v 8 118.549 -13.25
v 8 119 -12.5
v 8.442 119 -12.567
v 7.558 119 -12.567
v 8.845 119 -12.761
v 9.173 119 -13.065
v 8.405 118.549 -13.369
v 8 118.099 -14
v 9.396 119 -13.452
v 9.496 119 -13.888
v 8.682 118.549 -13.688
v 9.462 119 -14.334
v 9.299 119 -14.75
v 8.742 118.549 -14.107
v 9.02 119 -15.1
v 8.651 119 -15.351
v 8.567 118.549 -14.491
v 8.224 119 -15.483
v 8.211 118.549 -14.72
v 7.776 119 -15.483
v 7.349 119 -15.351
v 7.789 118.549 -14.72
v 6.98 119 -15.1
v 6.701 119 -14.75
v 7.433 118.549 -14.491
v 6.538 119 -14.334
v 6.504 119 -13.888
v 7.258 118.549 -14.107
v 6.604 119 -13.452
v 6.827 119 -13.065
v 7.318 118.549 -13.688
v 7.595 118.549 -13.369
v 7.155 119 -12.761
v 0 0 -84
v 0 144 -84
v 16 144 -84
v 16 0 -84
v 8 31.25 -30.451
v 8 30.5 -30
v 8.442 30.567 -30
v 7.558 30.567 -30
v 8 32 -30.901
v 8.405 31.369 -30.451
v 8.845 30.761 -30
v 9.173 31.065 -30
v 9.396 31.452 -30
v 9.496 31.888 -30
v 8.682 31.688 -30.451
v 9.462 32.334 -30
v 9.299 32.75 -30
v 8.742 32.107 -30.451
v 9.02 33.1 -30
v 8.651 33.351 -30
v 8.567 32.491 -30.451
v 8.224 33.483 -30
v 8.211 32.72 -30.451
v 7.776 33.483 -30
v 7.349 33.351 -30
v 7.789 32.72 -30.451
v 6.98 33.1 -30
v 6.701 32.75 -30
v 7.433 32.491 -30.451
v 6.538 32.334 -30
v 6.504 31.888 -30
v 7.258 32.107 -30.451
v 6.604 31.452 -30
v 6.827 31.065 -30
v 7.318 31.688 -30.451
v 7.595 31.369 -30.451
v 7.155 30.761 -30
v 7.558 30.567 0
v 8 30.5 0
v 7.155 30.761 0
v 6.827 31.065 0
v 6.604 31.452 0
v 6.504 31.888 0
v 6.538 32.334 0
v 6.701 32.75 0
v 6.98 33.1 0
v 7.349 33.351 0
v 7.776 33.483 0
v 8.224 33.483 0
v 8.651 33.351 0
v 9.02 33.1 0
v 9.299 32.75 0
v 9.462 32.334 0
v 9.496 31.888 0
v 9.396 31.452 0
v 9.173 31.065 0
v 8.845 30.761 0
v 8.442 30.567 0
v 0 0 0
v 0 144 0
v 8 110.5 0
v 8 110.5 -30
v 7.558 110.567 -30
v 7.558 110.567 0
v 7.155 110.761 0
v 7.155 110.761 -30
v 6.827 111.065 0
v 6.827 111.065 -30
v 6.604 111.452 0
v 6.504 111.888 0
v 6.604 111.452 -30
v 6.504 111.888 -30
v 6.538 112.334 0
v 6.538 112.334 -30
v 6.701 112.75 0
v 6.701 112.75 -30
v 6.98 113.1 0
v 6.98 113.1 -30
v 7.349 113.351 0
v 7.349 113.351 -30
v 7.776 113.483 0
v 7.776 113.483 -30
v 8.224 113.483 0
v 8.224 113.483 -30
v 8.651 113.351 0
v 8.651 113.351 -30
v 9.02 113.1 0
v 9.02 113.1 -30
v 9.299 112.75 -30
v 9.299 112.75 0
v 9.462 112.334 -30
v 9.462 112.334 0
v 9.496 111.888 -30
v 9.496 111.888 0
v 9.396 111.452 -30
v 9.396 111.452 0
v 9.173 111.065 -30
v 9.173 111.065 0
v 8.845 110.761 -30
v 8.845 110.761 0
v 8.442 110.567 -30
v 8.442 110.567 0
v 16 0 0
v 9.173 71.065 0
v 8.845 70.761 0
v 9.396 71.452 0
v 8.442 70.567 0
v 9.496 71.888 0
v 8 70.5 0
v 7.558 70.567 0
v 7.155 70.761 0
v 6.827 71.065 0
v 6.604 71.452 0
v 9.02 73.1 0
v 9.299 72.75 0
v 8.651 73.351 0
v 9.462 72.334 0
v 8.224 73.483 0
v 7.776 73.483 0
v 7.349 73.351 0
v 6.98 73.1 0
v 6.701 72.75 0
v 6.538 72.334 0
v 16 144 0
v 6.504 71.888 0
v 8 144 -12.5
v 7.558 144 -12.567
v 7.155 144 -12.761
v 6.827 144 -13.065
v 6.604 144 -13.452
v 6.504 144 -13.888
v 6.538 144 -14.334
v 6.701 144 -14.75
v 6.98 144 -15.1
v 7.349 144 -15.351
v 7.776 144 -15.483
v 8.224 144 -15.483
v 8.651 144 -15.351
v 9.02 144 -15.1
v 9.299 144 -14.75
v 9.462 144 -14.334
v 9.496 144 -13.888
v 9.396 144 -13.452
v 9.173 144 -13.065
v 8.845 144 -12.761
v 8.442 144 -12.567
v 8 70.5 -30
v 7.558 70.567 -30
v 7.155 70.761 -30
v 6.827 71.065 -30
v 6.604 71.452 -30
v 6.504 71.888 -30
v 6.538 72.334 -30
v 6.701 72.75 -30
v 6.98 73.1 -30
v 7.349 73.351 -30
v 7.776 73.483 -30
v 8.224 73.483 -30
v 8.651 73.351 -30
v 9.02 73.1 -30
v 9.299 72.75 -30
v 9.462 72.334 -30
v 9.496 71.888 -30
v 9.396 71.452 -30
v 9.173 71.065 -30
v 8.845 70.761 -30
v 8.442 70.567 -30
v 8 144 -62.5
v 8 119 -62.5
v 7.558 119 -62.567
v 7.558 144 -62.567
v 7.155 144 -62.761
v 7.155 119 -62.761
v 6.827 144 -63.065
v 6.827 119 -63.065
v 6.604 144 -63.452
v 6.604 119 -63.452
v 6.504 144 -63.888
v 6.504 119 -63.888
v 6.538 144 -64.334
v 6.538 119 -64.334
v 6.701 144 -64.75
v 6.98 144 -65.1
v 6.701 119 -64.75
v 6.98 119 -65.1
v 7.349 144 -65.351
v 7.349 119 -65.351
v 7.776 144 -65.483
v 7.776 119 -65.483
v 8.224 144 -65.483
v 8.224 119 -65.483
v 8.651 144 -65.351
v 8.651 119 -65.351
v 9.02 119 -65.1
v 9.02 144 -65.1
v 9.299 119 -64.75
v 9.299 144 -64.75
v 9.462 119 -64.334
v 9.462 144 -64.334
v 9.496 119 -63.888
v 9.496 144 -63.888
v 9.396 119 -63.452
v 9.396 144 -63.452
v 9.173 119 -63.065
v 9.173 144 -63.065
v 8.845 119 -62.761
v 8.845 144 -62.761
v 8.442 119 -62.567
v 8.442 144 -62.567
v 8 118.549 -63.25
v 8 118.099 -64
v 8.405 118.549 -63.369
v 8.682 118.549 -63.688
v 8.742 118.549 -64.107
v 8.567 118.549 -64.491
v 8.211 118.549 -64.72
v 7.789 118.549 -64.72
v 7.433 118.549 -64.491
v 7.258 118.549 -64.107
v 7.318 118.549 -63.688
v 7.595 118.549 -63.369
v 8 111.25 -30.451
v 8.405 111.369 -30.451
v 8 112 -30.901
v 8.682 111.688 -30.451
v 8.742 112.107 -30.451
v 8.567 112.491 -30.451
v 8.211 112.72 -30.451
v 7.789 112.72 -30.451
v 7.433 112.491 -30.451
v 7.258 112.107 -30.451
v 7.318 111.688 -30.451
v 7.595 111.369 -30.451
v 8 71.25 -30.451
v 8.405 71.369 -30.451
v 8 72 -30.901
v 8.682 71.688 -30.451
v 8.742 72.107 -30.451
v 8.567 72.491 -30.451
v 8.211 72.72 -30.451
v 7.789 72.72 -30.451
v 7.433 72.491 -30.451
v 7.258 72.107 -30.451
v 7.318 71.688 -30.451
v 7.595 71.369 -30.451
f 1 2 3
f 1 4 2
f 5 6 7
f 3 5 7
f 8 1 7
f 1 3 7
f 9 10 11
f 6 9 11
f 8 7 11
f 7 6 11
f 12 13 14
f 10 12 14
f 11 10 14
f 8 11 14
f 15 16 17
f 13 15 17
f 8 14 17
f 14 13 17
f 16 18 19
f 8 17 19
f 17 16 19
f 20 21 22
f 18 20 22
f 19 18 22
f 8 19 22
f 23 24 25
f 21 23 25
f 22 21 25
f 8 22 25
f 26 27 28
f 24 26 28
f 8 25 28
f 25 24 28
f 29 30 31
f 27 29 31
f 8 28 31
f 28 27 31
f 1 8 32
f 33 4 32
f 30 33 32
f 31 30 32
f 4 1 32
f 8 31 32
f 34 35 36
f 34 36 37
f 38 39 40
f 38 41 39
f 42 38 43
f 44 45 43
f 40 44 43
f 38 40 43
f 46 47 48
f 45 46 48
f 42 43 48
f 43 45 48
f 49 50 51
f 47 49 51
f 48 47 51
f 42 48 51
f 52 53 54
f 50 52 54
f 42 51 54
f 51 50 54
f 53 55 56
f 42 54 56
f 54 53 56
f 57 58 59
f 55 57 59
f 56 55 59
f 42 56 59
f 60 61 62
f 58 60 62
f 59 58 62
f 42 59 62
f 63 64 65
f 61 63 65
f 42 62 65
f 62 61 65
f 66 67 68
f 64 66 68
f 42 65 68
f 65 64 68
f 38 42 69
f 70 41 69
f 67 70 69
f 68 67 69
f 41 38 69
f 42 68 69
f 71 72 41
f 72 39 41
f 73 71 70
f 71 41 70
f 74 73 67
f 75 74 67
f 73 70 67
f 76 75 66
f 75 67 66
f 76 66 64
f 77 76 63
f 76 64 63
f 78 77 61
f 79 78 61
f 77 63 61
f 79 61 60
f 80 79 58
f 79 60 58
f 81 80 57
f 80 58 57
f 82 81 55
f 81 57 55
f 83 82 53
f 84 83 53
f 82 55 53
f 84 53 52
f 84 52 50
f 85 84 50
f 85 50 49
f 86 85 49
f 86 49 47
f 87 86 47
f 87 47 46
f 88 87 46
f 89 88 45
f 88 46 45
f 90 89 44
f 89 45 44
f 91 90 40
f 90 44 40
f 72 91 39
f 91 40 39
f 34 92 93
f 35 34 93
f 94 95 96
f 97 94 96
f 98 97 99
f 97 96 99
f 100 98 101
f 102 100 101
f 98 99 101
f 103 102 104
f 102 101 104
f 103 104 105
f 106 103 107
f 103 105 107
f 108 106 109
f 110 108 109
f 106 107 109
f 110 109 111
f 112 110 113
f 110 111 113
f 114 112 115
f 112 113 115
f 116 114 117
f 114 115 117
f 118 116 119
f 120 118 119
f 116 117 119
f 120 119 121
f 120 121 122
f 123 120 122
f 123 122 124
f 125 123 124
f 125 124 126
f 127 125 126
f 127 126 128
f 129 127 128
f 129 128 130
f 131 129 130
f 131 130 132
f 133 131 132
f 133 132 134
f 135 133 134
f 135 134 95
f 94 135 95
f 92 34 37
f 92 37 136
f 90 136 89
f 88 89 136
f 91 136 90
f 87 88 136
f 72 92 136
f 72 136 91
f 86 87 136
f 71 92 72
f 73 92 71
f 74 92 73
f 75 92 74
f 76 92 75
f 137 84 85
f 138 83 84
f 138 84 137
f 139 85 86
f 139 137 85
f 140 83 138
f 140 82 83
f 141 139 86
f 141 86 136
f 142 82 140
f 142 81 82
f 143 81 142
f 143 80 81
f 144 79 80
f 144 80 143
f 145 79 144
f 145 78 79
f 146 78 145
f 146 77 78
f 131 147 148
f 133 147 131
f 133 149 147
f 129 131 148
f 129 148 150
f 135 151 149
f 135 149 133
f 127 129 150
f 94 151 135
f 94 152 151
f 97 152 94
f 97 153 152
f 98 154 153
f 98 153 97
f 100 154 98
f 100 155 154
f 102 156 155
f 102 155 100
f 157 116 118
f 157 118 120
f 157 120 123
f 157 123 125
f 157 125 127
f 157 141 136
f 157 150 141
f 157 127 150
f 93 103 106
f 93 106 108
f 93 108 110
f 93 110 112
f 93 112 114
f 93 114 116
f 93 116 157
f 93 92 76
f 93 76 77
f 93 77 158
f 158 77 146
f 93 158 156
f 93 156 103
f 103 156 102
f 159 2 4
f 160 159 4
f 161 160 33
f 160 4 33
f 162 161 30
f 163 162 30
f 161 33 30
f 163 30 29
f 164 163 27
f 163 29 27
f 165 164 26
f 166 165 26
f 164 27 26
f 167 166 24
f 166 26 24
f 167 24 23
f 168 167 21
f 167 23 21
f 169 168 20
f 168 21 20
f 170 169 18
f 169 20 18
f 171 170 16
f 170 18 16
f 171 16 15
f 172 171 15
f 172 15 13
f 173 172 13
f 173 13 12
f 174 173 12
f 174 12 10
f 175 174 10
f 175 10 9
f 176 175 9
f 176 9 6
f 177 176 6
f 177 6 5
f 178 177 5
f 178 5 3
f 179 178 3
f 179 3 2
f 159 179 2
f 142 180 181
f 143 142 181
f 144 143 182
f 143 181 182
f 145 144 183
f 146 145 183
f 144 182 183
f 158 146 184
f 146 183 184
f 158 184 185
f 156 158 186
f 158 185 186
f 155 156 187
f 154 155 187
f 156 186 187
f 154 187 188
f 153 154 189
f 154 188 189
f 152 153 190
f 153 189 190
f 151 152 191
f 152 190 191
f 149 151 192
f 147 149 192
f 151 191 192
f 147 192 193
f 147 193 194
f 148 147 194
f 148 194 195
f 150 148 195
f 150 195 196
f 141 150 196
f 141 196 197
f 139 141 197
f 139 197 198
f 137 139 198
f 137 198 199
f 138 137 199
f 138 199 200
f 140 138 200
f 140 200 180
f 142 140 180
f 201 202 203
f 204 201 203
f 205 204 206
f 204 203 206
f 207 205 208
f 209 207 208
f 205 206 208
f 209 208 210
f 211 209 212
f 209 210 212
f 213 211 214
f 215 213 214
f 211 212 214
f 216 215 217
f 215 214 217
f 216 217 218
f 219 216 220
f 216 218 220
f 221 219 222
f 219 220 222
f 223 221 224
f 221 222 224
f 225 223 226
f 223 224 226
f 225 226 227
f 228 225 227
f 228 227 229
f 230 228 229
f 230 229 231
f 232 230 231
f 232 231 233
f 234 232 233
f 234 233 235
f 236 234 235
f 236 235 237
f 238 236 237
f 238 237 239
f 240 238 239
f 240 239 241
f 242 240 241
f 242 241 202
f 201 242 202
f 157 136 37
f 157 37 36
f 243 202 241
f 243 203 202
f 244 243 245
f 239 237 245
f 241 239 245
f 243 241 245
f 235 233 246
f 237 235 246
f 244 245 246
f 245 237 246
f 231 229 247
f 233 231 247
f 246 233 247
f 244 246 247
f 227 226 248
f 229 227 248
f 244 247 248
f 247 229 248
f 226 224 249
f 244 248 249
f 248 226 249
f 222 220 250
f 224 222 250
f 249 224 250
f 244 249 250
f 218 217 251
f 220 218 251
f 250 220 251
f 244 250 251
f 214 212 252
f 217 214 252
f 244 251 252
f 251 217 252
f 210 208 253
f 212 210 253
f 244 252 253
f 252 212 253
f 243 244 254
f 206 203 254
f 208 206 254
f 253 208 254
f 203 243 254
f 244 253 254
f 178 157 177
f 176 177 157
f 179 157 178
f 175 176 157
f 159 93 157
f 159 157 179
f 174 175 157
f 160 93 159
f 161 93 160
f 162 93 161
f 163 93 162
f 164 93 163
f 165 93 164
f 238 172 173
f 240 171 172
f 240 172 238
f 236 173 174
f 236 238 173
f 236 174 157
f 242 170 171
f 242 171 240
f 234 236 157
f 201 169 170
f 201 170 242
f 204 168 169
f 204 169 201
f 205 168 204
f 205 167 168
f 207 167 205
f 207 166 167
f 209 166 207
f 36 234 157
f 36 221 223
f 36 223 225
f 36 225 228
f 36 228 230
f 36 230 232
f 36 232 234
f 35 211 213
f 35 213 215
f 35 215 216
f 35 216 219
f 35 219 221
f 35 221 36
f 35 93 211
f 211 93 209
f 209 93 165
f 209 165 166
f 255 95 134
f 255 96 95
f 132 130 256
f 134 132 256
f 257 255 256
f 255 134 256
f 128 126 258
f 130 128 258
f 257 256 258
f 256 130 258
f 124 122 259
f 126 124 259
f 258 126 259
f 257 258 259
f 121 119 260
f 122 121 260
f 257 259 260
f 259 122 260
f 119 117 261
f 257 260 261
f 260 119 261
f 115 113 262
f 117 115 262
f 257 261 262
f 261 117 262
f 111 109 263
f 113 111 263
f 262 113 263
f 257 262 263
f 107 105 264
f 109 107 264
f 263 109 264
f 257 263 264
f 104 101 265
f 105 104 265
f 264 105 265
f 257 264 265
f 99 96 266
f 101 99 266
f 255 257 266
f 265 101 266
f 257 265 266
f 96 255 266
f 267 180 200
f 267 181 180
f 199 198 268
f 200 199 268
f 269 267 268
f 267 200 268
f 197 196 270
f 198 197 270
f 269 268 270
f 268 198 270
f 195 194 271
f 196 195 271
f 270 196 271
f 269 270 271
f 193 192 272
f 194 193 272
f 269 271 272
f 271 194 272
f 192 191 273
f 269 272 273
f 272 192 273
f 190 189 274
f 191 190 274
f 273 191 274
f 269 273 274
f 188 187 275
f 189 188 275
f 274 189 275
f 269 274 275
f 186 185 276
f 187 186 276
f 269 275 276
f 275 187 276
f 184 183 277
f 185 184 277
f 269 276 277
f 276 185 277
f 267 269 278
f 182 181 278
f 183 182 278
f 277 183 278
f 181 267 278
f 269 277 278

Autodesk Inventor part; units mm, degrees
ref_plane "YZ Plane" through (0, 0, 0) normal (1, 0, 0) x (0, 1, 0)
ref_plane "XZ Plane" through (0, 0, 0) normal (0, 1, 0) x (-1, 0, 0)
ref_plane "XY Plane" through (0, 0, 0) normal (0, 0, 1) x (1, 0, 0)
sketch "Skizze1" plane through (0, 0, 0) normal (1, 0, 0) x (0, 1, 0)
  line L0 (0, 0) -> (144, 0)
  line L1 (144, 0) -> (144, -84)
  line L2 (144, -84) -> (0, -84)
  line L3 (0, -84) -> (0, 0)
  dimension "d0" = 144
  dimension "d1" = 84
extrude "Extrusion1" add sketch "Skizze1" along normal blind 16
sketch "Skizze2" plane through (0, 0, 0) normal (0, 0, 1) x (1, 0, 0)
  line L0 (0, 0) -> (0, 144) construction
  line L1 (0, 72) -> (16, 72) construction
  line L2 (16, 144) -> (16, 0) construction
  line L3 (0, 144) -> (16, 144) construction
  line L4 (8, 144) -> (8, 0) construction
  line L5 (0, 144) -> (16, 144) construction
  line L6 (0, 0) -> (16, 0) construction
  line L7 (0, 144) -> (16, 144) construction
  line L8 (16, 144) -> (16, 0) construction
  line L9 (16, 0) -> (0, 0) construction
  line L10 (0, 0) -> (0, 144) construction
  line L11 (0, 112) -> (16, 112) construction
  line L12 (0, 32) -> (16, 32) construction
  point P0 (8, 112)
  point P1 (8, 72)
  point P2 (8, 32)
  dimension "d4" = 40
  dimension "d5" = 40
hole "Bohrung1" at (8, 112, 0) at (8, 72, 0) at (8, 32, 0) direction (0, 0, -1) diameter 3 depth 30 tip angle 118
sketch "Skizze3" plane through (0, 144, 0) normal (0, 1, 0) x (1, 0, 0)
  line L0 (0, 0) -> (16, 0)
  line L1 (16, 0) -> (16, 84)
  line L2 (16, 84) -> (0, 84)
  line L3 (0, 84) -> (0, 0)
  line L4 (8, 0) -> (8, 84) construction
  line L5 (0, 84) -> (16, 84) construction
  line L6 (16, 0) -> (16, 84) construction
  line L7 (16, 42) -> (0, 42) construction
  line L8 (0, 84) -> (0, 0) construction
  line L9 (0, 14) -> (16, 14) construction
  line L10 (0, 64) -> (16, 64) construction
  point P0 (8, 14)
  point P1 (8, 64)
  dimension "d13" = 20
  dimension "d14" = 50
hole "Bohrung2" at (8, 144, -14) at (8, 144, -64) direction (0, -1, 0) diameter 3 depth 25 tip angle 118
equation "\"Biegeradius\" = Stärke"
equation "\"BreiteBiegungsfreistellung\" = Stärke"
equation "\"TiefeBiegungsfreistellung\" = 0.5 * Stärke"
equation "\"GrößeEckenfreistellung\" = 4 * Stärke"
equation "\"MinimalRest\" = 2 * Stärke"
equation "\"Übergangsradius\" = Biegeradius"
equation "\"JacobiRadiusGröße\" = Biegeradius"
equation "\"Abstandsgröße\" = Stärke"
equation "\"Stärke\" = 0.5"
properties part number "licht_side_simple"
